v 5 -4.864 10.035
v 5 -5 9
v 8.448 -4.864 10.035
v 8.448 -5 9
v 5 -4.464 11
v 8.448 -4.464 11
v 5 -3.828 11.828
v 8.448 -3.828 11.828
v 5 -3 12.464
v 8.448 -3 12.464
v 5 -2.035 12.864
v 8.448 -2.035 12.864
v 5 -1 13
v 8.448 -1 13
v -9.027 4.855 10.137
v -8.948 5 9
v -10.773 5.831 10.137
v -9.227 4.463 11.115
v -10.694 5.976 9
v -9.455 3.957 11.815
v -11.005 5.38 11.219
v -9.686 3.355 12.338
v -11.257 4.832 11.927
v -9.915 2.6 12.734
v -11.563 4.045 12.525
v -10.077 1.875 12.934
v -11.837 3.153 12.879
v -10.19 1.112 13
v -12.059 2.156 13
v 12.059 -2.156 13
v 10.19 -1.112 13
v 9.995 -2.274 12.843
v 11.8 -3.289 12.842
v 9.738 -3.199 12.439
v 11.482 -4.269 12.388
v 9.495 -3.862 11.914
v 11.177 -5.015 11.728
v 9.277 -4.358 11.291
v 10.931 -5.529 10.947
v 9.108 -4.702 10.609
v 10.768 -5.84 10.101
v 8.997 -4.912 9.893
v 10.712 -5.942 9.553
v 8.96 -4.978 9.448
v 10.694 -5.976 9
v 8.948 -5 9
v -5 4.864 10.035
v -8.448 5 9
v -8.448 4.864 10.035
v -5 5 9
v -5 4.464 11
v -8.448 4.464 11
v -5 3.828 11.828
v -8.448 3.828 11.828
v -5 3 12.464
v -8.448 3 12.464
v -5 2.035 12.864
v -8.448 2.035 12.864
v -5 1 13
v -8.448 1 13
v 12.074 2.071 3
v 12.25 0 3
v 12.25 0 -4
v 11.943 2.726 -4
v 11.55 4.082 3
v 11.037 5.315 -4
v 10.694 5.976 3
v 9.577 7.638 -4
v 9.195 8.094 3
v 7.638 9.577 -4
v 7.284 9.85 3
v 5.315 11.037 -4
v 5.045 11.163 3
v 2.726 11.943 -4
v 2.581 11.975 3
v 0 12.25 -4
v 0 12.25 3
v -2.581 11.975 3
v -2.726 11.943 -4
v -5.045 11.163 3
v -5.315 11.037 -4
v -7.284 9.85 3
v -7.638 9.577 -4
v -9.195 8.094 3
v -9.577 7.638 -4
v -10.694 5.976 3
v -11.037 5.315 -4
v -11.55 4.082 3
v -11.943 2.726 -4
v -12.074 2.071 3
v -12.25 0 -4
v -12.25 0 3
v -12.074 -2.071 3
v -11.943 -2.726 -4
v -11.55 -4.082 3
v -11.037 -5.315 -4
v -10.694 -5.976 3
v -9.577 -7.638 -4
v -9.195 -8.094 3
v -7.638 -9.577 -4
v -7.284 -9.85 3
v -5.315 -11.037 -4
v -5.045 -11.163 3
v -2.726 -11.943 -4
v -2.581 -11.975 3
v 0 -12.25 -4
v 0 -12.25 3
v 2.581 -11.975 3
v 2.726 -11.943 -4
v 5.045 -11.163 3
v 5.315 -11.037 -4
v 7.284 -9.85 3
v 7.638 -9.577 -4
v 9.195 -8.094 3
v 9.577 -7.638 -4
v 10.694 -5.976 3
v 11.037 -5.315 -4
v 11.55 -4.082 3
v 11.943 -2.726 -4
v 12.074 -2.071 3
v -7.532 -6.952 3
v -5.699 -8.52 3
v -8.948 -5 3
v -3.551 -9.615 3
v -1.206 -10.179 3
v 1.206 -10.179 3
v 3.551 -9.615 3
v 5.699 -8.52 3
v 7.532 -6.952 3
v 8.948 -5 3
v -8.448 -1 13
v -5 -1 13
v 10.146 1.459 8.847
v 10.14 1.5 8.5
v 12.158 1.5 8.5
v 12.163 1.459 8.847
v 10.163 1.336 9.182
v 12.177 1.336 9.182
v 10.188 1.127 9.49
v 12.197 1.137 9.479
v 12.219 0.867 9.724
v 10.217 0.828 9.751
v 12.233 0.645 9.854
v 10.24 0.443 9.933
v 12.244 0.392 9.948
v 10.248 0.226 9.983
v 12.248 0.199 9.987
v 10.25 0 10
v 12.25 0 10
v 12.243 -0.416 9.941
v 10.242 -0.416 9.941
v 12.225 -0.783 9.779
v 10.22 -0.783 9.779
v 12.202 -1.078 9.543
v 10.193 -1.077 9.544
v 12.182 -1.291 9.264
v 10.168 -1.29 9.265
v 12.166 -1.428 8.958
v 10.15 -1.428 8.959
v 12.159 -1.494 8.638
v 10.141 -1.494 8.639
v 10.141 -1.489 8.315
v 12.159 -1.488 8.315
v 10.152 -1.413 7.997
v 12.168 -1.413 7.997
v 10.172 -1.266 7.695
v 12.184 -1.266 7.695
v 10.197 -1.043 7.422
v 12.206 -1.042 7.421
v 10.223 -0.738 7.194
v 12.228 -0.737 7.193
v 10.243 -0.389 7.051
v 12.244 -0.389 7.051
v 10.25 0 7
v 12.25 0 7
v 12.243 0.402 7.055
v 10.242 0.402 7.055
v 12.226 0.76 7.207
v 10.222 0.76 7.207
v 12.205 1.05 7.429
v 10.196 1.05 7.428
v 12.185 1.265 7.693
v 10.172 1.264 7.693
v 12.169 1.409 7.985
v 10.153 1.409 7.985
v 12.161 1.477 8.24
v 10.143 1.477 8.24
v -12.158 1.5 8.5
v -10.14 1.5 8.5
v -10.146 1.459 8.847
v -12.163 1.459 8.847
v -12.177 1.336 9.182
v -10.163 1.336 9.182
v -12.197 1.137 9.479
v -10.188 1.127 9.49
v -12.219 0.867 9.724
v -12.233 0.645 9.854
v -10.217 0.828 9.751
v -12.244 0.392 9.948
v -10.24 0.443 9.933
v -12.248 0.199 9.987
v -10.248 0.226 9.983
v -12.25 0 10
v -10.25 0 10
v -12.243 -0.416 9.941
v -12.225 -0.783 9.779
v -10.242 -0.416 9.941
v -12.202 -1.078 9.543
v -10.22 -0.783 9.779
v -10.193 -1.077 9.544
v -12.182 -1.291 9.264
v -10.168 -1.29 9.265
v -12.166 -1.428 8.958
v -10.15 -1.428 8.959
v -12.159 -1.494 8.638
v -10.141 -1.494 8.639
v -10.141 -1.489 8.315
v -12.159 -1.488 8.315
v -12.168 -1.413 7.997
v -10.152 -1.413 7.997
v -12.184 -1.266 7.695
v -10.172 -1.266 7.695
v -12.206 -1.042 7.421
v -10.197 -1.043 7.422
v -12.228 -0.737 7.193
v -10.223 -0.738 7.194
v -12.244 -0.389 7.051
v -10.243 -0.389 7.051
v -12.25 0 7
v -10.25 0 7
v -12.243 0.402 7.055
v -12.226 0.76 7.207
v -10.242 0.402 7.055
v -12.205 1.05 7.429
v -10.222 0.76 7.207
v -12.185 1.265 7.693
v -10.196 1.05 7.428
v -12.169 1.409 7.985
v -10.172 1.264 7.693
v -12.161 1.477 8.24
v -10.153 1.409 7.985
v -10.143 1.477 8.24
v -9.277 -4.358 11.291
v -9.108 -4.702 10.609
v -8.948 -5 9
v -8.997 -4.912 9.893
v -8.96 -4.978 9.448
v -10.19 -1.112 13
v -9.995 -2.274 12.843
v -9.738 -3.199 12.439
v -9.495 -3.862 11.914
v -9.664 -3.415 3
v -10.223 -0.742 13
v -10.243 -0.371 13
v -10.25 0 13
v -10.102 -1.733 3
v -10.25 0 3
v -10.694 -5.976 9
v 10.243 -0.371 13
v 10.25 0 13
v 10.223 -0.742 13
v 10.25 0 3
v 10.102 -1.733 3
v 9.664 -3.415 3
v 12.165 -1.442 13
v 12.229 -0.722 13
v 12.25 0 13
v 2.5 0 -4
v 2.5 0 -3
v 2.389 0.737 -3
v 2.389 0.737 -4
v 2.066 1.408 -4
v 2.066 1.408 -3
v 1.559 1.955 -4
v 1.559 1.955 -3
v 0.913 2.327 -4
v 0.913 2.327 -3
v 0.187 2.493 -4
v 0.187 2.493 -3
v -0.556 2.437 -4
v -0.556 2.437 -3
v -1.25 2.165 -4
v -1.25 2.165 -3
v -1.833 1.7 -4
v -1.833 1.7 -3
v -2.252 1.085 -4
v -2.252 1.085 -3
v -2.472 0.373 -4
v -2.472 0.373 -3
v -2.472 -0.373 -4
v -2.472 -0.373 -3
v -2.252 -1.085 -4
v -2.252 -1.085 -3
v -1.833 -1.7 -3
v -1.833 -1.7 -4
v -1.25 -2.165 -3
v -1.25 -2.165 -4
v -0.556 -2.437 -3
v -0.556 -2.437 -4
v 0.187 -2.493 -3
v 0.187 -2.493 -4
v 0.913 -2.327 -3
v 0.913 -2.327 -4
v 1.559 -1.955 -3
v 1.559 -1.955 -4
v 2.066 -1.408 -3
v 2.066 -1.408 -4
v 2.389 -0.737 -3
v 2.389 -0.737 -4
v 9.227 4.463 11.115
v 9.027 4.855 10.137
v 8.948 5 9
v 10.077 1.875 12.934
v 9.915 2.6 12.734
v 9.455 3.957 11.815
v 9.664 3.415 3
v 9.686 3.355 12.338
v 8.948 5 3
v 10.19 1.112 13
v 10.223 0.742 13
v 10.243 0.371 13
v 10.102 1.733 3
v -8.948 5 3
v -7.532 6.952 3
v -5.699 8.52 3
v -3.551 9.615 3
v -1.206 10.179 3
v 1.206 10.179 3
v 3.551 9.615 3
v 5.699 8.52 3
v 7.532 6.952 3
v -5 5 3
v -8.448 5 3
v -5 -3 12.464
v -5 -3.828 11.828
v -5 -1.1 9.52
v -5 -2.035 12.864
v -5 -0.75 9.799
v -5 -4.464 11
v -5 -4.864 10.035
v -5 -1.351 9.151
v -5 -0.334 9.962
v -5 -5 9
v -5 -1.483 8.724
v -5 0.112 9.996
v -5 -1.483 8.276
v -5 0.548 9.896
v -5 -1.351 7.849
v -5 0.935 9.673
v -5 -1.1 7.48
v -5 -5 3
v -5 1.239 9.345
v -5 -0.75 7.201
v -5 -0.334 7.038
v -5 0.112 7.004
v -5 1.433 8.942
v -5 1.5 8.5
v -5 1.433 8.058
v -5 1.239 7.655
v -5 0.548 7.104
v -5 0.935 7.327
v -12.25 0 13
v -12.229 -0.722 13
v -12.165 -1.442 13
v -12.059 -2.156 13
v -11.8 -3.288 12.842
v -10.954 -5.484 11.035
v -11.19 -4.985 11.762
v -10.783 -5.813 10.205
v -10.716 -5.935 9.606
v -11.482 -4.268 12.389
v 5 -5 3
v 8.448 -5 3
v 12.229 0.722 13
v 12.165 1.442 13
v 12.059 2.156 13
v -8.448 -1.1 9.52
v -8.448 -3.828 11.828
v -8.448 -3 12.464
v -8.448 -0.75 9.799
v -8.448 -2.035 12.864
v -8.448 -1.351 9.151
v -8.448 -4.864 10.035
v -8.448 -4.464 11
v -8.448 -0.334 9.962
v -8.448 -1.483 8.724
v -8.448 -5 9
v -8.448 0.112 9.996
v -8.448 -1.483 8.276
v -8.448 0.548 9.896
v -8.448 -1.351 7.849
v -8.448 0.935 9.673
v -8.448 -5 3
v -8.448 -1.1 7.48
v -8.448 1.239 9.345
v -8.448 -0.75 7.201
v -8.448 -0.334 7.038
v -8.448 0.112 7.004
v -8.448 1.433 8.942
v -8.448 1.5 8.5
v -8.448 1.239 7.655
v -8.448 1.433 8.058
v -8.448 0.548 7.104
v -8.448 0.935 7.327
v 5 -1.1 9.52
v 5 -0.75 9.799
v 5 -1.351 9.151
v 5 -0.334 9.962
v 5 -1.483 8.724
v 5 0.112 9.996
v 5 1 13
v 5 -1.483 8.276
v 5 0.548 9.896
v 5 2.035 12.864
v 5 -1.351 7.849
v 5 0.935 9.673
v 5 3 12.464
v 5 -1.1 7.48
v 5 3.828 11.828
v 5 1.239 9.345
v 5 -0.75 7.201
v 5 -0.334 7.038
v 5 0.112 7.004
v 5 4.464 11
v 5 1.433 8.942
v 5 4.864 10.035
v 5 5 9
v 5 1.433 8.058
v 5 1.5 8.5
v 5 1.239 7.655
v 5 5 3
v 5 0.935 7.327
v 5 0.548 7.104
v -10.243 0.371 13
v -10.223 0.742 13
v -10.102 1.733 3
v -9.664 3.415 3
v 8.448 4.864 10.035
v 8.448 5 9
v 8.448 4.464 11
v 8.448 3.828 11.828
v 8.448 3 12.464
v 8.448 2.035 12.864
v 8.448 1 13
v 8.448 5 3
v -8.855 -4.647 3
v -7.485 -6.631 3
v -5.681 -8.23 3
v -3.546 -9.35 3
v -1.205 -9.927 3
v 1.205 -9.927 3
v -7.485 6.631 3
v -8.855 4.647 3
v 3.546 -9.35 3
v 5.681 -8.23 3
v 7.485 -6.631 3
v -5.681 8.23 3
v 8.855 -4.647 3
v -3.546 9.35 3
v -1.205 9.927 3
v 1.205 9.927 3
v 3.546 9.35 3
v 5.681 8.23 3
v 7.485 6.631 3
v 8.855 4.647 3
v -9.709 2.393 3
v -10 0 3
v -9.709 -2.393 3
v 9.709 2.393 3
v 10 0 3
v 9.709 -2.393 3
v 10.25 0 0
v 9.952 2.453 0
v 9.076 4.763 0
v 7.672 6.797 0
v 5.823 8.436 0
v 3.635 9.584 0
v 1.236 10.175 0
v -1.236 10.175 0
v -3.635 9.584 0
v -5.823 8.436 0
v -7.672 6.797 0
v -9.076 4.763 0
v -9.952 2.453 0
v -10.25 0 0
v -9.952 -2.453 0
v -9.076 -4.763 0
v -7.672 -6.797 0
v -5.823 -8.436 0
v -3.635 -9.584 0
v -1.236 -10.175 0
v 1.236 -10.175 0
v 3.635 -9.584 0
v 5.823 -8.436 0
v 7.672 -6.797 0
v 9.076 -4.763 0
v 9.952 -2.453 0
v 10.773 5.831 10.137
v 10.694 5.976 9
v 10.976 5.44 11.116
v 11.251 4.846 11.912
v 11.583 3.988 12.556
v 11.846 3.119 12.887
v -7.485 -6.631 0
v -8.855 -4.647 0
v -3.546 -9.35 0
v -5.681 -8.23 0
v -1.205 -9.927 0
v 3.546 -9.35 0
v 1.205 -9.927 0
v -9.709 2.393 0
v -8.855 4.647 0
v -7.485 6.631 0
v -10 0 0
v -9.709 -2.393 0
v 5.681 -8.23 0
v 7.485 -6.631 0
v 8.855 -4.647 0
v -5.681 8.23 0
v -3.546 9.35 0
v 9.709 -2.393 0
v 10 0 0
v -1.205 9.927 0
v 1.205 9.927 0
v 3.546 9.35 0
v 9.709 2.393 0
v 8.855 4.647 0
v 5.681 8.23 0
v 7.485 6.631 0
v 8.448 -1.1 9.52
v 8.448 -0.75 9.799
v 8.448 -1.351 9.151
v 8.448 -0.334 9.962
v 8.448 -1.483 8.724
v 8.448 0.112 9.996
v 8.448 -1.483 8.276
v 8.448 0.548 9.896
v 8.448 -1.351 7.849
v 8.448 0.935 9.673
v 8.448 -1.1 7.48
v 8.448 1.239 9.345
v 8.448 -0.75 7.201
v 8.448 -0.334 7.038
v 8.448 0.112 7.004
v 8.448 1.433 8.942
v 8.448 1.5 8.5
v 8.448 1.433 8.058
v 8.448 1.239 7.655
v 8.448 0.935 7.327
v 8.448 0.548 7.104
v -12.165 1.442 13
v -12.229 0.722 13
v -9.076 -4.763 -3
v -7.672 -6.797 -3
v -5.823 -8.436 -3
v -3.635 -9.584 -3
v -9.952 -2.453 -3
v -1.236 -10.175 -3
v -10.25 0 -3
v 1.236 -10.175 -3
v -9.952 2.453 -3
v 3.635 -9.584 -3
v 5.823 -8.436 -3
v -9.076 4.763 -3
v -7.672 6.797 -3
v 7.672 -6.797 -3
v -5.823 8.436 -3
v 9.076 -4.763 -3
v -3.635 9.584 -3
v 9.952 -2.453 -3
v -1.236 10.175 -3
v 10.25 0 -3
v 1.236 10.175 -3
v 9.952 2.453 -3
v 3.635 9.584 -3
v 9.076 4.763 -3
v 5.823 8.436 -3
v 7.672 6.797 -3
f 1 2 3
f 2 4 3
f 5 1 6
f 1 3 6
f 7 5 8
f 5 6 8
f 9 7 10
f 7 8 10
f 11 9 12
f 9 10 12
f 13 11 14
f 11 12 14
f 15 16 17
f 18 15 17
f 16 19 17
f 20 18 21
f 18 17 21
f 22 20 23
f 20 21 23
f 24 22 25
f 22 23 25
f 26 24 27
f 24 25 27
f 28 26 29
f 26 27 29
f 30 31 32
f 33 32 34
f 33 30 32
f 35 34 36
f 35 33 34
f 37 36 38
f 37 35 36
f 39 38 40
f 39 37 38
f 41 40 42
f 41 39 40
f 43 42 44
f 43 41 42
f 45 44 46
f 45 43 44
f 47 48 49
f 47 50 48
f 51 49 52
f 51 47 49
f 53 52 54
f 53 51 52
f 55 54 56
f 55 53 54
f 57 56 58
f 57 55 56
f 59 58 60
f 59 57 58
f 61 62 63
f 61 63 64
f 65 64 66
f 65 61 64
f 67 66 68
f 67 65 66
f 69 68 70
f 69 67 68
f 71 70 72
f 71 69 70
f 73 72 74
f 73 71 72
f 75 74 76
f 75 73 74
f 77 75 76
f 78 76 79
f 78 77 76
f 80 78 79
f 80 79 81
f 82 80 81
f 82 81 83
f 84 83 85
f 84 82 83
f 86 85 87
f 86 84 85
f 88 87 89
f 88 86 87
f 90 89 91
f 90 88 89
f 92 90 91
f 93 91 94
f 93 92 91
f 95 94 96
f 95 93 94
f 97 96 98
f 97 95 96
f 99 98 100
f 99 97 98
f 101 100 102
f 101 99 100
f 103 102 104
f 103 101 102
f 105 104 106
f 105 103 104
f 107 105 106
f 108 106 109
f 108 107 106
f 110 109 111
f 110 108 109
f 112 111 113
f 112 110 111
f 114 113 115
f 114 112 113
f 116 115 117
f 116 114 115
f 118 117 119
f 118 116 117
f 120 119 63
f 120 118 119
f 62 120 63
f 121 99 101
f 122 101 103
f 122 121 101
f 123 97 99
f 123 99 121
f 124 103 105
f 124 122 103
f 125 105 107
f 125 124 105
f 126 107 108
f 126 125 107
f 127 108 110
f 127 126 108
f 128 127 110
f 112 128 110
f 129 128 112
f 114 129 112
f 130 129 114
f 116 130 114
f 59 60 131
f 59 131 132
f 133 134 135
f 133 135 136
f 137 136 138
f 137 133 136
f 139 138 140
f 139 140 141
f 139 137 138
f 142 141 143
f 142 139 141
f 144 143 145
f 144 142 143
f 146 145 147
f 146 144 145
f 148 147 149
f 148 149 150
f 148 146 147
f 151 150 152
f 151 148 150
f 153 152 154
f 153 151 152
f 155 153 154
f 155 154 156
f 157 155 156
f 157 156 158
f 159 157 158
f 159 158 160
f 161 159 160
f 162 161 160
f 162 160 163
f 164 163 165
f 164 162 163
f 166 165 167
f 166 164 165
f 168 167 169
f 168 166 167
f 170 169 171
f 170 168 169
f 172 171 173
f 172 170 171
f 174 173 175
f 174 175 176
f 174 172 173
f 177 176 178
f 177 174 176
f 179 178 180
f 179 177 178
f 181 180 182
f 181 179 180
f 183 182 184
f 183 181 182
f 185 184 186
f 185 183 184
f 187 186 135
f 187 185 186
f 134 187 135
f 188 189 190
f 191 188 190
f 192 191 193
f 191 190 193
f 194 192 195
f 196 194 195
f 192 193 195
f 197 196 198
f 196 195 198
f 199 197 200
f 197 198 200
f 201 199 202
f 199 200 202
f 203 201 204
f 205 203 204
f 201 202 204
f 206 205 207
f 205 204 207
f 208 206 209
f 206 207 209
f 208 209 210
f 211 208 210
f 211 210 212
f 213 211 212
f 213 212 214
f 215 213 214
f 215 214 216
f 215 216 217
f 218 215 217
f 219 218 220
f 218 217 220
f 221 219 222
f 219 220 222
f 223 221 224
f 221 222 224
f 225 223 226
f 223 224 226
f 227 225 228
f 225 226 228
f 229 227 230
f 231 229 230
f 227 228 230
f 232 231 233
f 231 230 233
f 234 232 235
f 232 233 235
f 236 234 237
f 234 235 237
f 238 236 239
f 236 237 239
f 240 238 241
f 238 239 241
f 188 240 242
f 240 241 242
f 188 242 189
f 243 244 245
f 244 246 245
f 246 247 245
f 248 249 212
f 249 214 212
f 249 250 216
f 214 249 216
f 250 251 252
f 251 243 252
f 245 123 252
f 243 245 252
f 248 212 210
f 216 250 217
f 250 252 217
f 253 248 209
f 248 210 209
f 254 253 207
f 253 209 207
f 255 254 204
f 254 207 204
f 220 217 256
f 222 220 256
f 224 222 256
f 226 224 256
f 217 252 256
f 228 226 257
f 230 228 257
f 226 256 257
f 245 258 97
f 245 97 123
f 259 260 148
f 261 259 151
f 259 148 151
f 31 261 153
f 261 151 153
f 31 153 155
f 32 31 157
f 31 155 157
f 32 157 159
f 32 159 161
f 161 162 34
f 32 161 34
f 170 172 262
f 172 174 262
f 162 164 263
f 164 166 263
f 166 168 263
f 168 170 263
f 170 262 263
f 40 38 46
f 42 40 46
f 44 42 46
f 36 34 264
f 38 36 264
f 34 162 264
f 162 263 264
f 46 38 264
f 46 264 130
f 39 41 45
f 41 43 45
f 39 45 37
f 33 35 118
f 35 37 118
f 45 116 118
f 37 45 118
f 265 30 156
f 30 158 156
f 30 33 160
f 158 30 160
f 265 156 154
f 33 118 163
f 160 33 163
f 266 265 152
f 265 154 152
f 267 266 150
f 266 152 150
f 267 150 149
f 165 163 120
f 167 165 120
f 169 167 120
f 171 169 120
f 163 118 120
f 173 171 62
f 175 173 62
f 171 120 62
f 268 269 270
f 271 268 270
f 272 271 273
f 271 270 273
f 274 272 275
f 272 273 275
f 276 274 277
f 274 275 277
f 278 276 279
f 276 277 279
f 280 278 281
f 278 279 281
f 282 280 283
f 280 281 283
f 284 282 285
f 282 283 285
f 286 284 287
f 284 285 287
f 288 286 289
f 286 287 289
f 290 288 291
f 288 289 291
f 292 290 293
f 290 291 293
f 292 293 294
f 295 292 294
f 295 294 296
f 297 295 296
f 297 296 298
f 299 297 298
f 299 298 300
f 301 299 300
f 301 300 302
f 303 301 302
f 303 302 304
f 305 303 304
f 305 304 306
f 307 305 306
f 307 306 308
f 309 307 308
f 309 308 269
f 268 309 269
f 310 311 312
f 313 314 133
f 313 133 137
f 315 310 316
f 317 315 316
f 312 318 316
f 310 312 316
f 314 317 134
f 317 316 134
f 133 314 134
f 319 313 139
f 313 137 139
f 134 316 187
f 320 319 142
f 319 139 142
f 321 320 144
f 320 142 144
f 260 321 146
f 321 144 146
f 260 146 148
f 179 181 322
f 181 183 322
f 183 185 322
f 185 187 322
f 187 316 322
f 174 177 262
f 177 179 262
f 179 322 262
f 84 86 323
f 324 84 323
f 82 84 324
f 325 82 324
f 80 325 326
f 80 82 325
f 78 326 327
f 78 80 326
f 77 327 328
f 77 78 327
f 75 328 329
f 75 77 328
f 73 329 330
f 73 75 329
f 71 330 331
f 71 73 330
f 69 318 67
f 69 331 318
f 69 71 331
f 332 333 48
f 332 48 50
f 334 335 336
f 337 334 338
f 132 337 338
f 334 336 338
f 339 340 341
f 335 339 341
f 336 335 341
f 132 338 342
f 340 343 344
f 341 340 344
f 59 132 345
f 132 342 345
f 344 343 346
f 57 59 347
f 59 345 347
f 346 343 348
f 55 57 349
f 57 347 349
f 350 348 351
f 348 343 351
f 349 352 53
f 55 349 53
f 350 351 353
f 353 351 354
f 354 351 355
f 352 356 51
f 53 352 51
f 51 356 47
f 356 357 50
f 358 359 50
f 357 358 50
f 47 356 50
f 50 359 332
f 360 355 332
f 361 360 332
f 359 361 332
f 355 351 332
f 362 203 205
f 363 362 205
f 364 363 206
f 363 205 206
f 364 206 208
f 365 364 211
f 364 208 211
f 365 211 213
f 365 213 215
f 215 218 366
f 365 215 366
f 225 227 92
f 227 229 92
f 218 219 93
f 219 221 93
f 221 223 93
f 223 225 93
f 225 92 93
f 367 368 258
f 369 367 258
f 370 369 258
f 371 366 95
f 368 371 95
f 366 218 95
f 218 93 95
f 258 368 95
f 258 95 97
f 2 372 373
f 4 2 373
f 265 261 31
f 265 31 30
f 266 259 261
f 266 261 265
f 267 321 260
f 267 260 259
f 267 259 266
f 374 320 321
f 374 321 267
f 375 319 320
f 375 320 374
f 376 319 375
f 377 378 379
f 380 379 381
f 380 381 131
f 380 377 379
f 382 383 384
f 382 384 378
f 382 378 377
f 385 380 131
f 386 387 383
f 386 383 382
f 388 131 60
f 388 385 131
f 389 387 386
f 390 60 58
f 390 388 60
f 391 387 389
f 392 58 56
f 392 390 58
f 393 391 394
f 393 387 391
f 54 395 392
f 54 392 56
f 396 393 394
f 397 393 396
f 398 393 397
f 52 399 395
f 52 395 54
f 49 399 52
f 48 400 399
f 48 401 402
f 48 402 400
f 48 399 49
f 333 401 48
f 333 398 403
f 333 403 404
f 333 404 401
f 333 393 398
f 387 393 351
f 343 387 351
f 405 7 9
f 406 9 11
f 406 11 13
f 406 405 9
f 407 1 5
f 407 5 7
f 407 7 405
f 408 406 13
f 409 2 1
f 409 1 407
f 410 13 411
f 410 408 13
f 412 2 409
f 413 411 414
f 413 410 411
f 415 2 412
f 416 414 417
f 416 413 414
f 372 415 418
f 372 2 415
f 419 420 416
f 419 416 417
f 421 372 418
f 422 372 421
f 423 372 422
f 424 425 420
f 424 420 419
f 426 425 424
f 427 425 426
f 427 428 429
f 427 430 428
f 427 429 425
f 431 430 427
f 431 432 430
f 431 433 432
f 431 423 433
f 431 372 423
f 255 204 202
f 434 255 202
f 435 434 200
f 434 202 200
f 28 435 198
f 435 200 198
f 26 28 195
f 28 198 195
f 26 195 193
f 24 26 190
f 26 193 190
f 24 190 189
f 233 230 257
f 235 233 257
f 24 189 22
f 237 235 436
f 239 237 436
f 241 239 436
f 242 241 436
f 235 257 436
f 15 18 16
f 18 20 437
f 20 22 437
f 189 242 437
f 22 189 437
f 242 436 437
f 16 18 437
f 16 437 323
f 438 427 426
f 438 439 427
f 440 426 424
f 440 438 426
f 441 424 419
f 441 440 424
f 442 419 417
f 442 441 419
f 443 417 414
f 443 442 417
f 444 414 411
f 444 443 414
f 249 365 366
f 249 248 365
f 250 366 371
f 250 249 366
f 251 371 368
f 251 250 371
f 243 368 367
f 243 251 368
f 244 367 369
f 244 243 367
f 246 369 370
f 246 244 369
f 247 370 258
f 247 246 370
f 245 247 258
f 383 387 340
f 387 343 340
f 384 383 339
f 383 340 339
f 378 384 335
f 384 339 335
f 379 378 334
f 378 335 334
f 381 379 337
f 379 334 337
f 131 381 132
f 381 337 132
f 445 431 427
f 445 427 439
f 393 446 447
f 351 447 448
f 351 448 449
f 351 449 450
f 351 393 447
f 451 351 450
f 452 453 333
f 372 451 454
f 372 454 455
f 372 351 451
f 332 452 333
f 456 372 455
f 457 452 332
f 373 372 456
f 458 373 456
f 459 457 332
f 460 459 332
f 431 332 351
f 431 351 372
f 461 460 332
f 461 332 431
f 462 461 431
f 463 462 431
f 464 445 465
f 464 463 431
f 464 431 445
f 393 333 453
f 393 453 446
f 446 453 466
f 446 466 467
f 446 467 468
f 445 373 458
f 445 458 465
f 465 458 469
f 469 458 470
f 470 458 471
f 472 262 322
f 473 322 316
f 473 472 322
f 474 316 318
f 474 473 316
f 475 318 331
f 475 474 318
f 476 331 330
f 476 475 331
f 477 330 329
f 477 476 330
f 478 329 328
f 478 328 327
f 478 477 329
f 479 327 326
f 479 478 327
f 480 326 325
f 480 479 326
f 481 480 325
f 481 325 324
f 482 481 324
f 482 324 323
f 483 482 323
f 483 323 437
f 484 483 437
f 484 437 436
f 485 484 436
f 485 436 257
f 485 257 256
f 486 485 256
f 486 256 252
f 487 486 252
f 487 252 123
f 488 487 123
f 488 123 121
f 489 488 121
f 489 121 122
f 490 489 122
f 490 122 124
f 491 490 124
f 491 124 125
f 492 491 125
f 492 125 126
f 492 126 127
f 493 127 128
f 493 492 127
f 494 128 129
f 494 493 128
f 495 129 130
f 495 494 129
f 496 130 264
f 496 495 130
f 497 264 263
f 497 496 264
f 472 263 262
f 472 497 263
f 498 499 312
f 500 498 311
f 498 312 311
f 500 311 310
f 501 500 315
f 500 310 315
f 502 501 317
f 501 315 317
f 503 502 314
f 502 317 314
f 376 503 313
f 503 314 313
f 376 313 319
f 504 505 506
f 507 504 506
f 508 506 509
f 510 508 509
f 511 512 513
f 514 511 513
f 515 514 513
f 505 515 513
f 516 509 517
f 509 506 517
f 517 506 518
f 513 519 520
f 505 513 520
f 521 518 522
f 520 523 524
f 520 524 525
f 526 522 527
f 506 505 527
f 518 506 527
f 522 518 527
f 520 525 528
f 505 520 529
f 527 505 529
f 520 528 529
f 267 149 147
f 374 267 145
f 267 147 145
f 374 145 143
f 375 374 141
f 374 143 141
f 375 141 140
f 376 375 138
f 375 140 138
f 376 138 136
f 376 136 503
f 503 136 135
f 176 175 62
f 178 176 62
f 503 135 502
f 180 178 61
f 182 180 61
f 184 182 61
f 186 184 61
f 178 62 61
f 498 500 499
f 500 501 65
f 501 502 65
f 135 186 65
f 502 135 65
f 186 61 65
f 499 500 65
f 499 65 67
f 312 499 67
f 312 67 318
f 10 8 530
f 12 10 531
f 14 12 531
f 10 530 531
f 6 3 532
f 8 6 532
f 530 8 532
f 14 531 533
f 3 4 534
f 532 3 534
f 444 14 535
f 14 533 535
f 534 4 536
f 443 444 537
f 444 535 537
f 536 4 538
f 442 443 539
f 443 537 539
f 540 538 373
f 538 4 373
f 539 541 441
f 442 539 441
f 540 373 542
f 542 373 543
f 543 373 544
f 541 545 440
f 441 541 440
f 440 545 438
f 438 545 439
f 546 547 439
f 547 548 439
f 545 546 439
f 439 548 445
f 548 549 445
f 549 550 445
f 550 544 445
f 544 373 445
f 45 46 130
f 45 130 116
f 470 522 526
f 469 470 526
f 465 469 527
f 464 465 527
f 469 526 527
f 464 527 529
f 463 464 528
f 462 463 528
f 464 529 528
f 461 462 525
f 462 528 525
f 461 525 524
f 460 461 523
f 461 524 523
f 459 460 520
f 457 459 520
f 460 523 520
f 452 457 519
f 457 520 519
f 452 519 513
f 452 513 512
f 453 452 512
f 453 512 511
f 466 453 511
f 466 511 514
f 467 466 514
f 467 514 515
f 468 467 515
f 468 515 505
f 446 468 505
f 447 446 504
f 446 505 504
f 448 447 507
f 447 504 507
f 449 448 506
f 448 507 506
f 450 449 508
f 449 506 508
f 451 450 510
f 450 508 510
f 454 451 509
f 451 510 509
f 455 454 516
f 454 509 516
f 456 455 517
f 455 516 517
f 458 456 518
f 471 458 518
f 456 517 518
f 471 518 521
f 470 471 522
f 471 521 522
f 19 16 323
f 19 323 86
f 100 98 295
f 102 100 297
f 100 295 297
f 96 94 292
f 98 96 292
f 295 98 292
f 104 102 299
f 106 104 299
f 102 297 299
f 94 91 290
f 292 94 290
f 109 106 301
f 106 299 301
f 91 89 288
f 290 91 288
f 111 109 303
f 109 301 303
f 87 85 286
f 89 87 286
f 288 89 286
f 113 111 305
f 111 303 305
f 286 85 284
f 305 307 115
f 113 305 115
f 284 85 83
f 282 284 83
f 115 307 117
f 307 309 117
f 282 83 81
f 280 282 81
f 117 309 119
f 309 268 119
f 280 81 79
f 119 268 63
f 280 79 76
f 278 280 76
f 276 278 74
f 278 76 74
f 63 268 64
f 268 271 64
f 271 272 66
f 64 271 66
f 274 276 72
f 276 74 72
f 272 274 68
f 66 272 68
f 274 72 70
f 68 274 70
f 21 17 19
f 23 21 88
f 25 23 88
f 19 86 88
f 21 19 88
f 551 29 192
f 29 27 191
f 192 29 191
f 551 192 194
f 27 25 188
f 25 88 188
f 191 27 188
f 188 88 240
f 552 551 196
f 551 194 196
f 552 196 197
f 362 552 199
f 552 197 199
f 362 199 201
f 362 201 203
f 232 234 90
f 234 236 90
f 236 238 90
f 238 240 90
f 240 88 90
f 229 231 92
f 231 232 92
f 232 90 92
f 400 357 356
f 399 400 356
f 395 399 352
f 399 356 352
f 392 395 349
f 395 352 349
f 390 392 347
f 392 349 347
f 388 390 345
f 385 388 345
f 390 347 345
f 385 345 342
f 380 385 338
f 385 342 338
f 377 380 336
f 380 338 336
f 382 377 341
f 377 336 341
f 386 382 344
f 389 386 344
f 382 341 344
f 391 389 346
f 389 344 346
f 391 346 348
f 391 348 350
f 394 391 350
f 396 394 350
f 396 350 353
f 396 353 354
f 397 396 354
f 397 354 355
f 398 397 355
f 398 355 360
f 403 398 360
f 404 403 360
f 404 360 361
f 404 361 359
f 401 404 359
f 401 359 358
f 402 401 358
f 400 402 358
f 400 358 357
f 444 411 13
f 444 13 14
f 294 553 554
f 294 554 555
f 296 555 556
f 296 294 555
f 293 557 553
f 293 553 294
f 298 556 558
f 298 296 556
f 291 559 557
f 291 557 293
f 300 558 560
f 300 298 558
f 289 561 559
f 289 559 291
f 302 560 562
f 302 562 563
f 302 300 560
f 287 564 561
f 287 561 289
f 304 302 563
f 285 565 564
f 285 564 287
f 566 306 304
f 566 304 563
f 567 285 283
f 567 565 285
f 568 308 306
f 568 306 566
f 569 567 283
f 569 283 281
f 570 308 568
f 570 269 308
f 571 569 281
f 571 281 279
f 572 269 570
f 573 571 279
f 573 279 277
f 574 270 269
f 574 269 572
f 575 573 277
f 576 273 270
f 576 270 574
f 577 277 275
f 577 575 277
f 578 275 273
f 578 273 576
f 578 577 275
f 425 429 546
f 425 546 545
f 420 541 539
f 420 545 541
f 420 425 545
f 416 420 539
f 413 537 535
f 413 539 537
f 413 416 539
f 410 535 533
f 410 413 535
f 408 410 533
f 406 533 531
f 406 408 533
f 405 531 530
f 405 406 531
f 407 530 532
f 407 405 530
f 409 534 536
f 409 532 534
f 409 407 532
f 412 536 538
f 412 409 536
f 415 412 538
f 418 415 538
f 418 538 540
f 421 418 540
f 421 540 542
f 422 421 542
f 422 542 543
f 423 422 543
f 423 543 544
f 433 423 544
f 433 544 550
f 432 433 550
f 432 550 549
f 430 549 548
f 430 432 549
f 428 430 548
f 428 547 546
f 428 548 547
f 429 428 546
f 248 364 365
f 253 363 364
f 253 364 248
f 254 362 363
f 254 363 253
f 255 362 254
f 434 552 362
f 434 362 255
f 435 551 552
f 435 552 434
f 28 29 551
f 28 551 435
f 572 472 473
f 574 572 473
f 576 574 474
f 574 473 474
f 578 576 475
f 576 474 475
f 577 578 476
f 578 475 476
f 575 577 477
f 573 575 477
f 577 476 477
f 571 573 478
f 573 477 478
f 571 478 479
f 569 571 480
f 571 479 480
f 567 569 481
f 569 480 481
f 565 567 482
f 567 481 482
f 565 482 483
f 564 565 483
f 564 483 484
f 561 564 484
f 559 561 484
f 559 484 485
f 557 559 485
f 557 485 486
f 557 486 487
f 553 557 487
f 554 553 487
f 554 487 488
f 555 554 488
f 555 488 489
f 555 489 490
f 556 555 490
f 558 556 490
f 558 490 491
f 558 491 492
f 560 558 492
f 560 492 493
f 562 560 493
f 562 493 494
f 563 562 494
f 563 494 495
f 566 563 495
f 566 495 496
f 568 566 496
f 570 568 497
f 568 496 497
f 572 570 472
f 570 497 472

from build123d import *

# Parameters (mm, degrees)
F0_R           = 10
F1_DEPTH       = 3
F0_R_2         = 12.25
F0_R_3         = 10.25
F2_DEPTH       = 3
F2_DEPTH_BACK  = 4
F3_START       = -3
F3_DEPTH       = 1
F5_DEPTH       = 10
F6_R           = 2.5
F7_DEPTH       = 1.001
F8_W           = 3.4477650841
F8_H           = 10
F9_DEPTH       = 10
F10_R          = 4
F10_2_R        = 4
F11_R          = 1.5
F12_DEPTH      = 12.2510001
F12_DEPTH_BACK = 12.2510001


with BuildPart() as f1:
    # F0 (on Top) → F1 (new body)
    with BuildSketch(Plane.XY):
        Circle(F0_R)
    extrude(amount=F1_DEPTH)

    # F8 (on face) → F9 (join, through all)
    with BuildSketch(Plane.XY.offset(3)):
        with Locations((6.723882542, 0)):
            Rectangle(F8_W, F8_H)
        with Locations((-6.723882542, 0)):
            Rectangle(F8_W, F8_H)
    extrude(amount=F9_DEPTH)

    # F10#2
    f10_2_edges = [f1.edges().sort_by_distance(p)[0] for p in [
        (6.723883, -5, 13),
        (-6.723883, -5, 13),
        (6.723883, 5, 13),
        (-6.723883, 5, 13),
    ]]
    fillet(f10_2_edges, radius=F10_2_R)


with BuildPart() as f2:
    # F0 (on Top) → F2 (new body, two sides)
    with BuildSketch(Plane.XY) as f2_sk:
        Circle(F0_R_2)
        Circle(F0_R_3, mode=Mode.SUBTRACT)
    extrude(amount=F2_DEPTH)
    extrude(f2_sk.sketch, amount=-F2_DEPTH_BACK)

    # F0 (on Top) → F3 (join)
    with BuildSketch(Plane.XY.offset(F3_START)):
        Circle(F0_R_3)
        Circle(F0_R, mode=Mode.SUBTRACT)
        Circle(F0_R)
    extrude(amount=-F3_DEPTH)

    # F4 (on face) → F5 (join)
    with BuildSketch(Plane.XY.offset(3)):
        with BuildLine():
            ThreePointArc((-8.9477650841, -5), (-9.9191000628, -2.5833996872), (-10.25, 0))
            ThreePointArc((-10.25, 0), (-9.9191000628, 2.5833996872), (-8.9477650841, 5))
            Line((-8.9477650841, 5), (-10.6936704663, 5.9756097561))
            ThreePointArc((-10.6936704663, 5.9756097561), (-11.8545342214, 3.087477675), (-12.25, 0))
            ThreePointArc((-12.25, 0), (-11.8545342214, -3.087477675), (-10.6936704663, -5.9756097561))
            Line((-10.6936704663, -5.9756097561), (-8.9477650841, -5))
        make_face()
        with BuildLine():
            ThreePointArc((12.25, 0), (11.8545342214, 3.087477675), (10.6936704663, 5.9756097561))
            Line((10.6936704663, 5.9756097561), (8.9477650841, 5))
            ThreePointArc((8.9477650841, 5), (9.9191000628, 2.5833996872), (10.25, 0))
            ThreePointArc((10.25, 0), (9.9191000628, -2.5833996872), (8.9477650841, -5))
            Line((8.9477650841, -5), (10.6936704663, -5.9756097561))
            ThreePointArc((10.6936704663, -5.9756097561), (11.8545342214, -3.087477675), (12.25, 0))
        make_face()
    extrude(amount=F5_DEPTH)

    # F6 (on face) → F7 (cut, through all)
    with BuildSketch(Plane.XY.offset(-3)):
        Circle(F6_R)
    extrude(amount=-F7_DEPTH, mode=Mode.SUBTRACT)

    # F10
    f10_edges = [f2.edges().sort_by_distance(p)[0] for p in [
        (-9.820718, 5.487805, 13),
        (-9.820718, -5.487805, 13),
        (9.820718, -5.487805, 13),
        (9.820718, 5.487805, 13),
    ]]
    fillet(f10_edges, radius=F10_R)


with BuildPart() as f12_tool:
    # F11 (on Right) → F12 (new body, two sides)
    with BuildSketch(Plane.YZ) as f12_sk:
        with Locations((0, 8.5)):
            Circle(F11_R)
    extrude(amount=-F12_DEPTH)
    extrude(f12_sk.sketch, amount=F12_DEPTH_BACK)


with BuildPart() as f1_1:
    add(f1.part)

    # F12: cut by f12_tool
    add(f12_tool.part, mode=Mode.SUBTRACT)


with BuildPart() as f2_1:
    add(f2.part)

    # F12: cut by f12_tool
    add(f12_tool.part, mode=Mode.SUBTRACT)


solid = Compound([f1_1.part, f2_1.part])
